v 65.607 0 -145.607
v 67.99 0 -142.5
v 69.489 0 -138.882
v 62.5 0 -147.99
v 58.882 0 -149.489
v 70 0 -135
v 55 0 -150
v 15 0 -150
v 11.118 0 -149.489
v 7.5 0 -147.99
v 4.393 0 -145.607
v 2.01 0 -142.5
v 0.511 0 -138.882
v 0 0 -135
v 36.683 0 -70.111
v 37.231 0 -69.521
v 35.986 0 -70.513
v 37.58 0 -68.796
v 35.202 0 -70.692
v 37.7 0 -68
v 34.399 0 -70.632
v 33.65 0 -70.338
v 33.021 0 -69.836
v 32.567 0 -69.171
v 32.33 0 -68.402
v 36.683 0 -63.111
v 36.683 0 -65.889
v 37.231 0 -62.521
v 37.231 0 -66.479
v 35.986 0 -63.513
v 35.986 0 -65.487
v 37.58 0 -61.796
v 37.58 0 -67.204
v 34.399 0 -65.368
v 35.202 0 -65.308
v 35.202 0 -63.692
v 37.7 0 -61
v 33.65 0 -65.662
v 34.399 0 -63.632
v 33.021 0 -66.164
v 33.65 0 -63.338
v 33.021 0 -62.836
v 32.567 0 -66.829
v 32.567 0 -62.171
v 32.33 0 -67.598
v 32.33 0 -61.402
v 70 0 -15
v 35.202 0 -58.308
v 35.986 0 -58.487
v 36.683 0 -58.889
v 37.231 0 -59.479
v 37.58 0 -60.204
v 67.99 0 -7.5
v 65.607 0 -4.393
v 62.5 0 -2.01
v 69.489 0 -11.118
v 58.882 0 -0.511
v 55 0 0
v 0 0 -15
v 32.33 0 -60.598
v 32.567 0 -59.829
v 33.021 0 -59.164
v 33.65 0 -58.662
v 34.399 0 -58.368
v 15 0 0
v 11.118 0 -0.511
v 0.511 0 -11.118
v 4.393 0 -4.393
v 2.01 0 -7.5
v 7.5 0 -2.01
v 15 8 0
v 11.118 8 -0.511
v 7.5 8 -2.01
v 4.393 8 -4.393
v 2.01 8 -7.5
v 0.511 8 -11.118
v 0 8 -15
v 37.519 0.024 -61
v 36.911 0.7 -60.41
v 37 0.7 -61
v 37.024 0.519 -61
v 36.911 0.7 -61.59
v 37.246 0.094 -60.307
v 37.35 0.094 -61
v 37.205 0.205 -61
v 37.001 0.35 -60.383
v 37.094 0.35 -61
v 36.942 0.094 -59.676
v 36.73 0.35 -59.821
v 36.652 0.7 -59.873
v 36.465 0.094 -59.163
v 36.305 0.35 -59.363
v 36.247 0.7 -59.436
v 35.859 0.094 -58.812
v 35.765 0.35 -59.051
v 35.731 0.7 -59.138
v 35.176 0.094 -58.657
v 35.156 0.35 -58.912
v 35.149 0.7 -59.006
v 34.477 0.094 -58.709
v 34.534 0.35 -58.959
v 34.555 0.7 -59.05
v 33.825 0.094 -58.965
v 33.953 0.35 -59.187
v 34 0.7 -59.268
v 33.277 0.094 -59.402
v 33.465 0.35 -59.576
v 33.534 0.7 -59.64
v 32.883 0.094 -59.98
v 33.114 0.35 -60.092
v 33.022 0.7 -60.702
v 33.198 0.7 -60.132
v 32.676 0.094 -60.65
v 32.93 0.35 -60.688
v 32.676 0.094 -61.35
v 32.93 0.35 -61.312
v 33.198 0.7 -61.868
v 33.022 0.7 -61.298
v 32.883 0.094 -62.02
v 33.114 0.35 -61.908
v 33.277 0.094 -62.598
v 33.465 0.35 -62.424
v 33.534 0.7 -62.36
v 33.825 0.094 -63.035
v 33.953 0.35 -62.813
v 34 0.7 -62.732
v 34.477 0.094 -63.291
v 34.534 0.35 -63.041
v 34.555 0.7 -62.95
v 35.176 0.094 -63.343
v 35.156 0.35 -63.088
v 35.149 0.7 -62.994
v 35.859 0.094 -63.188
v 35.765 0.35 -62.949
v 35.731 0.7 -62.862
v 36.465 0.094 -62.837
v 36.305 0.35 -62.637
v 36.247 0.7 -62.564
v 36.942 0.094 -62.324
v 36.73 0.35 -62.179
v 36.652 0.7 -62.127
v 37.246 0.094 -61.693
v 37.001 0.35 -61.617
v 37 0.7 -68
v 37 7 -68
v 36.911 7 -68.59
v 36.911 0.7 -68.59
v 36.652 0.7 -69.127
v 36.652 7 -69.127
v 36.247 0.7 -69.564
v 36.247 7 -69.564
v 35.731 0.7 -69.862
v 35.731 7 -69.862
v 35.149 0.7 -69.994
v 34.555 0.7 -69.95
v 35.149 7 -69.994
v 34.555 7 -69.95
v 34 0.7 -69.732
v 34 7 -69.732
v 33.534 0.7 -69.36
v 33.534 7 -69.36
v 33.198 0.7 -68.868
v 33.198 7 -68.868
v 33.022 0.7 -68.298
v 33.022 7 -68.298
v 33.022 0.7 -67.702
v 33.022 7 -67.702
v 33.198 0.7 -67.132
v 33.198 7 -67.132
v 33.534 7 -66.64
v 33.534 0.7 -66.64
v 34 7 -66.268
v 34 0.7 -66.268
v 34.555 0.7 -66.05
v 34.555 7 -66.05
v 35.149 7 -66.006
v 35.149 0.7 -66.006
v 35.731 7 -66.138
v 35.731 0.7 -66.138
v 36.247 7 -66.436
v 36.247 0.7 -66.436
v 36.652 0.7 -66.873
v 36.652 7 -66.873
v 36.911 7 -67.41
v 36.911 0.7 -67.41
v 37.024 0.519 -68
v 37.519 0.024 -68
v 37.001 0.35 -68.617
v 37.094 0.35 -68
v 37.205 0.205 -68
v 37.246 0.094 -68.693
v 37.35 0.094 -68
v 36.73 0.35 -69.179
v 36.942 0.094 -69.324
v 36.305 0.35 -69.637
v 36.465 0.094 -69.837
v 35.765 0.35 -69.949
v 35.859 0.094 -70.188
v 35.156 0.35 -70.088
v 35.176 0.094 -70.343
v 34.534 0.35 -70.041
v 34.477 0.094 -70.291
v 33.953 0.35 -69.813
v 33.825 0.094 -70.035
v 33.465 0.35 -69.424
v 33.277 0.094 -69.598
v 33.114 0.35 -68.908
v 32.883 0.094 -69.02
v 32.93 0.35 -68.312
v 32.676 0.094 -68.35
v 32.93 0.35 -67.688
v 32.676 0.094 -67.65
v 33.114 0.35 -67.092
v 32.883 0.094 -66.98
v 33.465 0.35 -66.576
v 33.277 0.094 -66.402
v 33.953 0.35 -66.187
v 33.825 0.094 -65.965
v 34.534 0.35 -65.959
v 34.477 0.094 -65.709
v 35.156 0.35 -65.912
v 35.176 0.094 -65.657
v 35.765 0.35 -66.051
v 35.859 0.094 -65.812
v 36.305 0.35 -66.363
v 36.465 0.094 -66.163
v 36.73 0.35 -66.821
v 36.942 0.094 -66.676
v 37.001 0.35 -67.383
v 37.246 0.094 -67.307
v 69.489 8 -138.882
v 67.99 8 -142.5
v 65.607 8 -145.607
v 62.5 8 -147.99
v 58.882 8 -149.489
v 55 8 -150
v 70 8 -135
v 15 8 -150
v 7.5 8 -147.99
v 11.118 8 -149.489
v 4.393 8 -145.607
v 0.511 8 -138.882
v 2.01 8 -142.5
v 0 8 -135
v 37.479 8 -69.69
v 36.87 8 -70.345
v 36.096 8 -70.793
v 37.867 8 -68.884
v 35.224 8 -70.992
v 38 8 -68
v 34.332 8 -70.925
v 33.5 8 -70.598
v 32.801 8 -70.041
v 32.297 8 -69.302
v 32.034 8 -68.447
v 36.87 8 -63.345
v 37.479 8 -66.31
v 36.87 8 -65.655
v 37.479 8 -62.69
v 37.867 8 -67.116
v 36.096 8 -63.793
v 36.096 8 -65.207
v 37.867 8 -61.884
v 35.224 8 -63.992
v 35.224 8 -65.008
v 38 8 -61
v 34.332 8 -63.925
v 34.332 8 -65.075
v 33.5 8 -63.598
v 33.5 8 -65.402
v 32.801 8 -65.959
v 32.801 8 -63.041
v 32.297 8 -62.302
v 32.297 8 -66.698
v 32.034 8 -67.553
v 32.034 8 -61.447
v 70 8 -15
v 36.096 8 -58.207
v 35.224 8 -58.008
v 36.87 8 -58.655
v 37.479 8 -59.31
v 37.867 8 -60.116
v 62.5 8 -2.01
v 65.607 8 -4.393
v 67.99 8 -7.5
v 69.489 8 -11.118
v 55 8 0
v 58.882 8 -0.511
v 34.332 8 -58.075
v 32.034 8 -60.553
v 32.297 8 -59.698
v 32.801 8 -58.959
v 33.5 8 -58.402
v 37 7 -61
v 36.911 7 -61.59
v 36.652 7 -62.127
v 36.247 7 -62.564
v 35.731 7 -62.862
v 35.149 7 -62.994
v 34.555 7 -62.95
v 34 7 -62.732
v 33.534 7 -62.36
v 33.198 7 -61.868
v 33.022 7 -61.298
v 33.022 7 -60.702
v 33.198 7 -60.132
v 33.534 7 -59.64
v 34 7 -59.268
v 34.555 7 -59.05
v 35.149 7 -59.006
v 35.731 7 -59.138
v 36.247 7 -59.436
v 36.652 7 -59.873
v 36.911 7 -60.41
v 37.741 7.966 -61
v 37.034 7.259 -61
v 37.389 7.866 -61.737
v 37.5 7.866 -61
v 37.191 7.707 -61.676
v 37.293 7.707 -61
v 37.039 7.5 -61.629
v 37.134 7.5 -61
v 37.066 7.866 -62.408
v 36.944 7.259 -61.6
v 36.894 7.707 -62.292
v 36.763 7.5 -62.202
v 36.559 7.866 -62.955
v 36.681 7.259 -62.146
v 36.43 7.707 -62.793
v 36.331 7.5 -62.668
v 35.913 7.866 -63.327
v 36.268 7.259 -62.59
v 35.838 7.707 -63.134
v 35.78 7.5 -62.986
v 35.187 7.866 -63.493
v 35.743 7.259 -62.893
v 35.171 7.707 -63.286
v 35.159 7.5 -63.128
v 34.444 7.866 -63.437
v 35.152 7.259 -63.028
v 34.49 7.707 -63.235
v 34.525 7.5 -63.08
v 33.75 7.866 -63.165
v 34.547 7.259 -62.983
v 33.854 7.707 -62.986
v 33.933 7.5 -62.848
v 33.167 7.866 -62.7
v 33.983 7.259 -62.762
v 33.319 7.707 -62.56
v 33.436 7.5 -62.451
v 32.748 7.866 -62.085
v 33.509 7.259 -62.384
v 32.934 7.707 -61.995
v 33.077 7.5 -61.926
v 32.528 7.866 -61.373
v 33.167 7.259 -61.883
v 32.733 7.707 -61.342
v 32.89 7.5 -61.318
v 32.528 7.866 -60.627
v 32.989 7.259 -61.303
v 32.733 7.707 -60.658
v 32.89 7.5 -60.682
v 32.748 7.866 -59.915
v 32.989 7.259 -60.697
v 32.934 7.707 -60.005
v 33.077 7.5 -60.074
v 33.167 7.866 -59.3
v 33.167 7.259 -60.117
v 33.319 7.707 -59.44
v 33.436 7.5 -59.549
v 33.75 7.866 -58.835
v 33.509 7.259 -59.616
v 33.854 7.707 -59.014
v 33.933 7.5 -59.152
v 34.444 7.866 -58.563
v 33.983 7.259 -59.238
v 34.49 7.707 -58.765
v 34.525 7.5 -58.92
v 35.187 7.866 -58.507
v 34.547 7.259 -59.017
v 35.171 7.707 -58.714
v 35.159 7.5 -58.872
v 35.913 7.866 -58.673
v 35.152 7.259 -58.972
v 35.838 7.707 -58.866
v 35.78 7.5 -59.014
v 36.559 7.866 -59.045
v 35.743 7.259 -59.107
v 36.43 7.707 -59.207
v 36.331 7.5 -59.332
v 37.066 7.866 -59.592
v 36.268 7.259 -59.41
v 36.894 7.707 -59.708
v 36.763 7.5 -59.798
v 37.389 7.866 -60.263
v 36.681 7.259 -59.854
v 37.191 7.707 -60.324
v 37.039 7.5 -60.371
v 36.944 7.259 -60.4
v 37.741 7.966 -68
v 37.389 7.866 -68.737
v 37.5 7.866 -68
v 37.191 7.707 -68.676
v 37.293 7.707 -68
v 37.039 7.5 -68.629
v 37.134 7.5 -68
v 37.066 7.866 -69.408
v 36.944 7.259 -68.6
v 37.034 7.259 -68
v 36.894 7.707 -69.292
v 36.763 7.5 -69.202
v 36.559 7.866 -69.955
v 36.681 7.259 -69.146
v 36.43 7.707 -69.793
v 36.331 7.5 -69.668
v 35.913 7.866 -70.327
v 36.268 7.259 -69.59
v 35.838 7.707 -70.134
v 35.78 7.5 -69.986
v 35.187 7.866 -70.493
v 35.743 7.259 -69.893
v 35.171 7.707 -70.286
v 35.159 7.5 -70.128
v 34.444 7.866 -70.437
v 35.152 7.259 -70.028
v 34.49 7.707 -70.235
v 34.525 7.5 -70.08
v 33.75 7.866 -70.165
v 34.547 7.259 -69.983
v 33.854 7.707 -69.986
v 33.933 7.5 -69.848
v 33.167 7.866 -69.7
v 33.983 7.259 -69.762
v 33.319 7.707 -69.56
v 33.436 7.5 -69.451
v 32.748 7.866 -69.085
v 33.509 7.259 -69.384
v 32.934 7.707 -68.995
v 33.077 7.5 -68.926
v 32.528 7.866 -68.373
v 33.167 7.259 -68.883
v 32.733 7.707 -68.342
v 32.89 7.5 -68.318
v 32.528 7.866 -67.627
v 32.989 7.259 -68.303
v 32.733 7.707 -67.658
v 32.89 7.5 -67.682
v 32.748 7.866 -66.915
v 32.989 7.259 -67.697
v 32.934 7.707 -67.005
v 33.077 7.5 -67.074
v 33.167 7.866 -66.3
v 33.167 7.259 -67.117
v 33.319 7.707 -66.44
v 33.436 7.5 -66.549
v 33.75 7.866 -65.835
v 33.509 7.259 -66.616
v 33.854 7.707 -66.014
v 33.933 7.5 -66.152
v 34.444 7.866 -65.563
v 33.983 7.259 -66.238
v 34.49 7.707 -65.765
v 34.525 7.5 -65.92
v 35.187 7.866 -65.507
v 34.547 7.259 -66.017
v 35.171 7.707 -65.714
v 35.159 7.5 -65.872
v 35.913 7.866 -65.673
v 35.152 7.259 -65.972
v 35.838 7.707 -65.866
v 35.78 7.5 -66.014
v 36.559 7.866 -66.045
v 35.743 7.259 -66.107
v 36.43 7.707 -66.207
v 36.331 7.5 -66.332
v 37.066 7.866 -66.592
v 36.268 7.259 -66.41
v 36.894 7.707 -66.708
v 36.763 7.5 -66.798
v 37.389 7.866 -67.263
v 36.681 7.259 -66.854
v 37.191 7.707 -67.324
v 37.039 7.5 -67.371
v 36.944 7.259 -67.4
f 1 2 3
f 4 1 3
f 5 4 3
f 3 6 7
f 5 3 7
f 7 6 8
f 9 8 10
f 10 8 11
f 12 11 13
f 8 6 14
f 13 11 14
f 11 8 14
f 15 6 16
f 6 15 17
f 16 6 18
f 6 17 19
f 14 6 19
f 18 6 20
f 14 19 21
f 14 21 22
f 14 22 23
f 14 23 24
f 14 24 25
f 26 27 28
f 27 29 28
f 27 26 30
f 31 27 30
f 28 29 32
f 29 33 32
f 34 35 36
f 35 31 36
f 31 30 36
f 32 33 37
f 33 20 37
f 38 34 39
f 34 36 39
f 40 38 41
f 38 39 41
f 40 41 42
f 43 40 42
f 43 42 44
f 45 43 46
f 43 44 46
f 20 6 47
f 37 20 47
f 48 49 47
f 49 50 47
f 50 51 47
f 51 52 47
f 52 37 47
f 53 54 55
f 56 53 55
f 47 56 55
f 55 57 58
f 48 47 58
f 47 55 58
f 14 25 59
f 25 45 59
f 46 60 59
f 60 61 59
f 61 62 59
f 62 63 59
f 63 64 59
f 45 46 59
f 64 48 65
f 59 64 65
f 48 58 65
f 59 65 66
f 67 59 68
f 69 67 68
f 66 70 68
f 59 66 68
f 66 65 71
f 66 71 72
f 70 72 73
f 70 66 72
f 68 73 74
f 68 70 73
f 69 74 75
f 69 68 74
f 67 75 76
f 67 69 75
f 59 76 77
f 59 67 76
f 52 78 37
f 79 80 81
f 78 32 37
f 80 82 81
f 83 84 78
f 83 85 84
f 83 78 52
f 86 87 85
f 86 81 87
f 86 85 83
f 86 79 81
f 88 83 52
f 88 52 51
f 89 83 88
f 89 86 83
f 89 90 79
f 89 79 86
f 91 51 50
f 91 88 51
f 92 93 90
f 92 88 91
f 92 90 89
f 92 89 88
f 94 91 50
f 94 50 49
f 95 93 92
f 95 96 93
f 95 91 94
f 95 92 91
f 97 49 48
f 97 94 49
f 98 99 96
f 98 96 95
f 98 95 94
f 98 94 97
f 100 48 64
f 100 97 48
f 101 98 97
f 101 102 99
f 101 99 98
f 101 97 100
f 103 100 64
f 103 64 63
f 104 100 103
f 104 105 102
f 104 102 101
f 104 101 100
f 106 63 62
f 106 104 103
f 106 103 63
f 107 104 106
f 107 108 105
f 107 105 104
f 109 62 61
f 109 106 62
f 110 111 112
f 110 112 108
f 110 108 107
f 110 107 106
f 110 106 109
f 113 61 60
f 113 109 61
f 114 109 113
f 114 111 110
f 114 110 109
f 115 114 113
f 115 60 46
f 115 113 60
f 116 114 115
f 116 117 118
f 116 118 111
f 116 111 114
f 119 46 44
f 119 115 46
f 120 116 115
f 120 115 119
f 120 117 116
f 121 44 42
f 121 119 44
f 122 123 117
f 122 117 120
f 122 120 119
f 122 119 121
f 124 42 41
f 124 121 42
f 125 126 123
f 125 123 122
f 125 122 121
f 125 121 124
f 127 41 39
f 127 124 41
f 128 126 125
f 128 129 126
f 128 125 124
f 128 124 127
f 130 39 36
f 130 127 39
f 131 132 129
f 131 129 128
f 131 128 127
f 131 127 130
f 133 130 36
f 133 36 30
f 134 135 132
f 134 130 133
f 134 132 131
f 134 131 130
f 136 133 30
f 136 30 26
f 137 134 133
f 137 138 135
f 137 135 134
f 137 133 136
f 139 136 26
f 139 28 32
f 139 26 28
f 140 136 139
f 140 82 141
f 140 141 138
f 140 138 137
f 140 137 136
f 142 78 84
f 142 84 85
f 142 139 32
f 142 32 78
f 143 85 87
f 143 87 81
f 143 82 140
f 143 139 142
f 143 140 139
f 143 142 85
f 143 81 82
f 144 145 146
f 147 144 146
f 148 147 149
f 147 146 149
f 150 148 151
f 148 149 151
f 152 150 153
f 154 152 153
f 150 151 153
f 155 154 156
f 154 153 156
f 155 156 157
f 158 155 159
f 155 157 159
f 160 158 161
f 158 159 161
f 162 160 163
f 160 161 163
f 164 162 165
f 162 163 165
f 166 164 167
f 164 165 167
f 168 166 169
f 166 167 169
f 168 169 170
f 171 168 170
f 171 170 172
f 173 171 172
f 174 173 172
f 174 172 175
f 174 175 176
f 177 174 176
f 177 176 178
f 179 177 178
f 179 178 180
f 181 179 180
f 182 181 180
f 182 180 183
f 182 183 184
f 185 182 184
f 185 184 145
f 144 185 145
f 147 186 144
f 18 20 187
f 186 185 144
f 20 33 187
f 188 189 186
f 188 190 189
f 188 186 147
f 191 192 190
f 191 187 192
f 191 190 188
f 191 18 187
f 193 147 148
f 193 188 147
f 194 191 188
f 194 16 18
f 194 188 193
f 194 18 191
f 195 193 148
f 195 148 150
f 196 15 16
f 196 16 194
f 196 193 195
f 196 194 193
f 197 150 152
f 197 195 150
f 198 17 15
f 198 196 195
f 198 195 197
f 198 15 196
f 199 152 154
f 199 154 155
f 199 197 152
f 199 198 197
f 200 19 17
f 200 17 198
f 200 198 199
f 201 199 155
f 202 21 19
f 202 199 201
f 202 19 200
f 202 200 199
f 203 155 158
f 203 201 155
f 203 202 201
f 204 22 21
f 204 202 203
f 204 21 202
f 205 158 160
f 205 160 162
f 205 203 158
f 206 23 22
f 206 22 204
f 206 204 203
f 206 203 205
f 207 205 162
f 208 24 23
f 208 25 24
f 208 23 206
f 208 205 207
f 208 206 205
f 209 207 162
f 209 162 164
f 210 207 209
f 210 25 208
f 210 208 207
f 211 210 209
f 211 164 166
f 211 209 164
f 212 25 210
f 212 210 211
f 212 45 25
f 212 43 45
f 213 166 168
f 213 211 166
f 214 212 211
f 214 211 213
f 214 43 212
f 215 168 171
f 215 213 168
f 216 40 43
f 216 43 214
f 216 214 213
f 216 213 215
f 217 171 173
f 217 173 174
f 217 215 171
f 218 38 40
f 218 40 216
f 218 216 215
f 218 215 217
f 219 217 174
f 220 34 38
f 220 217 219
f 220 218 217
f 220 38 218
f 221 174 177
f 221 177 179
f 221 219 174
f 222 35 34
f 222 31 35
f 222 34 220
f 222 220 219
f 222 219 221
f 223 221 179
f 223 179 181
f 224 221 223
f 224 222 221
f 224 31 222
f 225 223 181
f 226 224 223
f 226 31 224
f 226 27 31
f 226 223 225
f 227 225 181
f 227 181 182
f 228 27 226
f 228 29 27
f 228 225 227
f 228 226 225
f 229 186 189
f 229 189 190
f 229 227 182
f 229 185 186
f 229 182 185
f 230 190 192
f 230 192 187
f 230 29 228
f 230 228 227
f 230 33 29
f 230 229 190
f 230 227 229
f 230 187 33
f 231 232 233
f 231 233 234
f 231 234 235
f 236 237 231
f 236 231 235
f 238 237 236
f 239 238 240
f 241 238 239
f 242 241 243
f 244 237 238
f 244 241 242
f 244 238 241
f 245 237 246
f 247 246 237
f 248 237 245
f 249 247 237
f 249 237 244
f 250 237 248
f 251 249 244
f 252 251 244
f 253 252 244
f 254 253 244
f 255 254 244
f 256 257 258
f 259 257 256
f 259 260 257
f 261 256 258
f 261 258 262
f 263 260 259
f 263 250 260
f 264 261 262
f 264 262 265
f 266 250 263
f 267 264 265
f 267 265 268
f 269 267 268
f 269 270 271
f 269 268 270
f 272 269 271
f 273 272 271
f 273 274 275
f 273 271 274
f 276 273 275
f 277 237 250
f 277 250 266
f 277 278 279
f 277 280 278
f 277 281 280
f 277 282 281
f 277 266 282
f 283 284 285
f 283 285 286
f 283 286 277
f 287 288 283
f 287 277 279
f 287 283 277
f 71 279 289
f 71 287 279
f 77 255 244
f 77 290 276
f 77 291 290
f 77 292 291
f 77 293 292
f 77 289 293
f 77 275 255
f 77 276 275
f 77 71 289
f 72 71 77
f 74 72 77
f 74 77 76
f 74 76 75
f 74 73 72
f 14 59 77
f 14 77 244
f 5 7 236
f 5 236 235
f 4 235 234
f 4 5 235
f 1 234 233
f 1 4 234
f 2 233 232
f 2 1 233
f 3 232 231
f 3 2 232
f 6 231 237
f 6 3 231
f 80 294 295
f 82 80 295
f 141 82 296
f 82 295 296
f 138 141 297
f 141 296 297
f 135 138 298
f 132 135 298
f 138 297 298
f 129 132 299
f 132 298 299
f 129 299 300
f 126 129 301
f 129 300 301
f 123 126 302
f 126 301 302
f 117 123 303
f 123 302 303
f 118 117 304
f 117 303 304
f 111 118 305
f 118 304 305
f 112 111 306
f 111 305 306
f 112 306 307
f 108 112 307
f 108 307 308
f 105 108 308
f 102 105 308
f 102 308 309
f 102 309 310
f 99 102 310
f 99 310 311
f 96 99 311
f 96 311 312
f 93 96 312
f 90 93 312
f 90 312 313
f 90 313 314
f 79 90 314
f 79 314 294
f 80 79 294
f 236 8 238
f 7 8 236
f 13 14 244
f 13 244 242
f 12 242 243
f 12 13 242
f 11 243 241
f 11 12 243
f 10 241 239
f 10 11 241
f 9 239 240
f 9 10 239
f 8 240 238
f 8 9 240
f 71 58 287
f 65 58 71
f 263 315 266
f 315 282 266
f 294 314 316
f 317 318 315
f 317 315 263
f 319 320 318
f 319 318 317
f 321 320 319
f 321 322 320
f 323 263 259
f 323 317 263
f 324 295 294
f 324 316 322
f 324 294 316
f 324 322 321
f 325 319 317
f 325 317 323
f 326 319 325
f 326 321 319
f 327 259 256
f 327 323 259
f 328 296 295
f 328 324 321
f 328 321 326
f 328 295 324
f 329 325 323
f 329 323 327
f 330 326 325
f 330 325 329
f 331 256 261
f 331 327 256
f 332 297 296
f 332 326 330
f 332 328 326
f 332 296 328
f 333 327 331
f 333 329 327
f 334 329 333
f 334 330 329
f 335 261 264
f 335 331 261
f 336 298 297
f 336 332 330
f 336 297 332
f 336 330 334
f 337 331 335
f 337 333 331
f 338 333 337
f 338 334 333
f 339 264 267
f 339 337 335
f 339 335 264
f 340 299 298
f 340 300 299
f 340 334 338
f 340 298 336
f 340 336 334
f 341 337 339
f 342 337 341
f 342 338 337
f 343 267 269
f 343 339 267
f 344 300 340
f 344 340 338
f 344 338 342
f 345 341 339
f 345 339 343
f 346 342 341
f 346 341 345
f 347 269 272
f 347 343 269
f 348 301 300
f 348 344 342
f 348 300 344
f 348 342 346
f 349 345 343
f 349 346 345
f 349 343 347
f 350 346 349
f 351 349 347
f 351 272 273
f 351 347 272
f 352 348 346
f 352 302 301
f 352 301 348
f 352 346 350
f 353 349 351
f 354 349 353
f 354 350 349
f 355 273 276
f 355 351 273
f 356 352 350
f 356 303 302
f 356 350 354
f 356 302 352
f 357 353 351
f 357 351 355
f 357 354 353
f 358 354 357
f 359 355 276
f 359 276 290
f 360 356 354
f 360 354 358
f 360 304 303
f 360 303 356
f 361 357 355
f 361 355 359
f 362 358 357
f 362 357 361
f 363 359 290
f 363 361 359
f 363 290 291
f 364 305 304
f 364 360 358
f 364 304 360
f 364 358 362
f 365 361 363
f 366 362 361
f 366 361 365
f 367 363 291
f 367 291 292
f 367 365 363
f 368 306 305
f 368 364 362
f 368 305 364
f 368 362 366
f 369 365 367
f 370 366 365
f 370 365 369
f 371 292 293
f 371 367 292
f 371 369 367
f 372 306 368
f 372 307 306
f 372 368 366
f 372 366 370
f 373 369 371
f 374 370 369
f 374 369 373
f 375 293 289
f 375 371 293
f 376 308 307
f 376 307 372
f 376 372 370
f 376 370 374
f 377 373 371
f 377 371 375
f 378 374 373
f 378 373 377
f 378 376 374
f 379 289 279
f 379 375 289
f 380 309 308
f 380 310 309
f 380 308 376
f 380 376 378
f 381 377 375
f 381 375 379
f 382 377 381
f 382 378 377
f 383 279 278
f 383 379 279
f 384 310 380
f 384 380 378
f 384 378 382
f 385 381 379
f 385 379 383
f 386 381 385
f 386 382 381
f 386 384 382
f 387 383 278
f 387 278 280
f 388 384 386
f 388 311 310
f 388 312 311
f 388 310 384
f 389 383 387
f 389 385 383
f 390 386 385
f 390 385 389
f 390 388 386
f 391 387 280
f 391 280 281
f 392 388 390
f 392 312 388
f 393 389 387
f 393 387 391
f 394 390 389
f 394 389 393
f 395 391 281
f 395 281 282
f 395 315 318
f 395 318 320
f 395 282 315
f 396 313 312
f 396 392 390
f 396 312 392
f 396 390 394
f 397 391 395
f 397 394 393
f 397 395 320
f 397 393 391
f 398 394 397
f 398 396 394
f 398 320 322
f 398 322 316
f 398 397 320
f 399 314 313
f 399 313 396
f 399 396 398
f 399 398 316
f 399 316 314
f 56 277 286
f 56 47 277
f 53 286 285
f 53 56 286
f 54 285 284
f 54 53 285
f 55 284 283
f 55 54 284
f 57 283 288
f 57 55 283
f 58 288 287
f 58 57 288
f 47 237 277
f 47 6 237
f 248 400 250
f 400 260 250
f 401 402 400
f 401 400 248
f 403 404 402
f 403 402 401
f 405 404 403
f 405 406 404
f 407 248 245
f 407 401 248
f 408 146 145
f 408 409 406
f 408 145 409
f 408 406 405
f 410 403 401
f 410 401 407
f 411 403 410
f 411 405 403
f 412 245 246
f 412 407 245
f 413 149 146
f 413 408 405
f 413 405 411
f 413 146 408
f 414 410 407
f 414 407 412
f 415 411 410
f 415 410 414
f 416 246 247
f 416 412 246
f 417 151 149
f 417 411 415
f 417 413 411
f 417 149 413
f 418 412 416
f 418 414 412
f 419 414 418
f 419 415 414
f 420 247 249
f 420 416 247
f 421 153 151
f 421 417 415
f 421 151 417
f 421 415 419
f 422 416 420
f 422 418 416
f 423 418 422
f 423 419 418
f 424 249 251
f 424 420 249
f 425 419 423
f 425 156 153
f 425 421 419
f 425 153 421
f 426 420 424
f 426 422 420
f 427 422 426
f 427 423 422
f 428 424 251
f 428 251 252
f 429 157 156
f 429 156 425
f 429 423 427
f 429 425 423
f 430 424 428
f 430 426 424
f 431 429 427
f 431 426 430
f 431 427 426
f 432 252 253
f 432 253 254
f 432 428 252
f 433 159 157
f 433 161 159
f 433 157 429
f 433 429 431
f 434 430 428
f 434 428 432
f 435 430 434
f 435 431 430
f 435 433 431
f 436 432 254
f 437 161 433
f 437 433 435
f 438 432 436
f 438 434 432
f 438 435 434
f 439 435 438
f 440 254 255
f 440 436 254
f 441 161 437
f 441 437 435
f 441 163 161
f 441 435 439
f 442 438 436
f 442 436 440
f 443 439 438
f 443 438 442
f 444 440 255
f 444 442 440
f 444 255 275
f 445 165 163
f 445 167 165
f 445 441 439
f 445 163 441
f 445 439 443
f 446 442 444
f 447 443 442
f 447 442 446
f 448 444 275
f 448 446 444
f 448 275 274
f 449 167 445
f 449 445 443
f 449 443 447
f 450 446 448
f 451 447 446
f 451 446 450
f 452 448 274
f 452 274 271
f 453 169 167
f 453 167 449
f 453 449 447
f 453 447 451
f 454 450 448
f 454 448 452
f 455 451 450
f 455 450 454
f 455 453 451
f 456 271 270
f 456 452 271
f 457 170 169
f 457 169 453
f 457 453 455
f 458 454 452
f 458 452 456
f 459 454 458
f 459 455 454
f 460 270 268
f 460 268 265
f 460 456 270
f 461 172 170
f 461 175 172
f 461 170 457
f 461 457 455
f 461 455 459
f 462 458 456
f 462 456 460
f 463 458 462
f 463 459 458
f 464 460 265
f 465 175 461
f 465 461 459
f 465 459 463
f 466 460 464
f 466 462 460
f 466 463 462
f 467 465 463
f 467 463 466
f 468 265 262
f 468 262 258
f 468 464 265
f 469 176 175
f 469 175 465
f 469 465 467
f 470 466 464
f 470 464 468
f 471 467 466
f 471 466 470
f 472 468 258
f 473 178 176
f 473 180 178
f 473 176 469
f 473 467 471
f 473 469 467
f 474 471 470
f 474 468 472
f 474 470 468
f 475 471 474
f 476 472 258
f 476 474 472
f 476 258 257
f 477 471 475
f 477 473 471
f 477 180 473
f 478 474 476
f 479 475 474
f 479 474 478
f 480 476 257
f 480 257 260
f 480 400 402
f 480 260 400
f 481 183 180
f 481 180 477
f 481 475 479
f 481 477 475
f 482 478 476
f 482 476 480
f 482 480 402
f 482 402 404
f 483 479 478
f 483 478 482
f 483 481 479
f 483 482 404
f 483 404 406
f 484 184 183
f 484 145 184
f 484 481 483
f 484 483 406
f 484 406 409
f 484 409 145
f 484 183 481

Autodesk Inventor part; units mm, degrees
ref_plane "YZ Plane" through (0, 0, 0) normal (1, 0, 0) x (0, 1, 0)
ref_plane "XZ Plane" through (0, 0, 0) normal (0, 1, 0) x (-1, 0, 0)
ref_plane "XY Plane" through (0, 0, 0) normal (0, 0, 1) x (1, 0, 0)
sketch "Esboço4" plane through (0, 0, 0) normal (0, 1, 0) x (-1, 0, 0)
  line L0 (0, -15) -> (0, -135)
  line L1 (-15, -150) -> (-55, -150)
  line L2 (-70, -135) -> (-70, -15)
  line L3 (-55, 0) -> (-15, 0)
  arc A0 (-15, -150) -> (0, -135) centre (-15, -135) ccw
  arc A1 (-70, -135) -> (-55, -150) centre (-55, -135) ccw
  arc A2 (-55, 0) -> (-70, -15) centre (-55, -15) ccw
  arc A3 (0, -15) -> (-15, 0) centre (-15, -15) ccw
  point P0 (0, 0)
  point P1 (0, -150)
  point P2 (-70, -150)
  dimension "d7" = 150
  dimension "d8" = 70
  dimension "d9" = 15
extrude "Extrusão2" add sketch "Esboço4" along normal blind 8
sketch "Esboço5" plane through (0, 8, 0) normal (0, 1, 0) x (1, 0, 0)
  line L0 (15, 0) -> (55, 0) projected
  line L1 (55, 150) -> (15, 150) projected
  circle A0 centre (35, 68) radius 2
  circle A1 centre (35, 61) radius 2
  point P0 (0, 0)
  dimension "d13" = 4
  dimension "d15" = 4
extrude "Extrusão3" cut sketch "Esboço5" against normal through all
fillet "Arredondamento1" radius 1 2 edges at (33, 8, -68) (33, 8, -61)
fillet "Arredondamento2" radius 0.7 2 edges at (33, 0, -61) (33, 0, -68)
properties part number "Base superior(suporte)" material "ABS plástico"
